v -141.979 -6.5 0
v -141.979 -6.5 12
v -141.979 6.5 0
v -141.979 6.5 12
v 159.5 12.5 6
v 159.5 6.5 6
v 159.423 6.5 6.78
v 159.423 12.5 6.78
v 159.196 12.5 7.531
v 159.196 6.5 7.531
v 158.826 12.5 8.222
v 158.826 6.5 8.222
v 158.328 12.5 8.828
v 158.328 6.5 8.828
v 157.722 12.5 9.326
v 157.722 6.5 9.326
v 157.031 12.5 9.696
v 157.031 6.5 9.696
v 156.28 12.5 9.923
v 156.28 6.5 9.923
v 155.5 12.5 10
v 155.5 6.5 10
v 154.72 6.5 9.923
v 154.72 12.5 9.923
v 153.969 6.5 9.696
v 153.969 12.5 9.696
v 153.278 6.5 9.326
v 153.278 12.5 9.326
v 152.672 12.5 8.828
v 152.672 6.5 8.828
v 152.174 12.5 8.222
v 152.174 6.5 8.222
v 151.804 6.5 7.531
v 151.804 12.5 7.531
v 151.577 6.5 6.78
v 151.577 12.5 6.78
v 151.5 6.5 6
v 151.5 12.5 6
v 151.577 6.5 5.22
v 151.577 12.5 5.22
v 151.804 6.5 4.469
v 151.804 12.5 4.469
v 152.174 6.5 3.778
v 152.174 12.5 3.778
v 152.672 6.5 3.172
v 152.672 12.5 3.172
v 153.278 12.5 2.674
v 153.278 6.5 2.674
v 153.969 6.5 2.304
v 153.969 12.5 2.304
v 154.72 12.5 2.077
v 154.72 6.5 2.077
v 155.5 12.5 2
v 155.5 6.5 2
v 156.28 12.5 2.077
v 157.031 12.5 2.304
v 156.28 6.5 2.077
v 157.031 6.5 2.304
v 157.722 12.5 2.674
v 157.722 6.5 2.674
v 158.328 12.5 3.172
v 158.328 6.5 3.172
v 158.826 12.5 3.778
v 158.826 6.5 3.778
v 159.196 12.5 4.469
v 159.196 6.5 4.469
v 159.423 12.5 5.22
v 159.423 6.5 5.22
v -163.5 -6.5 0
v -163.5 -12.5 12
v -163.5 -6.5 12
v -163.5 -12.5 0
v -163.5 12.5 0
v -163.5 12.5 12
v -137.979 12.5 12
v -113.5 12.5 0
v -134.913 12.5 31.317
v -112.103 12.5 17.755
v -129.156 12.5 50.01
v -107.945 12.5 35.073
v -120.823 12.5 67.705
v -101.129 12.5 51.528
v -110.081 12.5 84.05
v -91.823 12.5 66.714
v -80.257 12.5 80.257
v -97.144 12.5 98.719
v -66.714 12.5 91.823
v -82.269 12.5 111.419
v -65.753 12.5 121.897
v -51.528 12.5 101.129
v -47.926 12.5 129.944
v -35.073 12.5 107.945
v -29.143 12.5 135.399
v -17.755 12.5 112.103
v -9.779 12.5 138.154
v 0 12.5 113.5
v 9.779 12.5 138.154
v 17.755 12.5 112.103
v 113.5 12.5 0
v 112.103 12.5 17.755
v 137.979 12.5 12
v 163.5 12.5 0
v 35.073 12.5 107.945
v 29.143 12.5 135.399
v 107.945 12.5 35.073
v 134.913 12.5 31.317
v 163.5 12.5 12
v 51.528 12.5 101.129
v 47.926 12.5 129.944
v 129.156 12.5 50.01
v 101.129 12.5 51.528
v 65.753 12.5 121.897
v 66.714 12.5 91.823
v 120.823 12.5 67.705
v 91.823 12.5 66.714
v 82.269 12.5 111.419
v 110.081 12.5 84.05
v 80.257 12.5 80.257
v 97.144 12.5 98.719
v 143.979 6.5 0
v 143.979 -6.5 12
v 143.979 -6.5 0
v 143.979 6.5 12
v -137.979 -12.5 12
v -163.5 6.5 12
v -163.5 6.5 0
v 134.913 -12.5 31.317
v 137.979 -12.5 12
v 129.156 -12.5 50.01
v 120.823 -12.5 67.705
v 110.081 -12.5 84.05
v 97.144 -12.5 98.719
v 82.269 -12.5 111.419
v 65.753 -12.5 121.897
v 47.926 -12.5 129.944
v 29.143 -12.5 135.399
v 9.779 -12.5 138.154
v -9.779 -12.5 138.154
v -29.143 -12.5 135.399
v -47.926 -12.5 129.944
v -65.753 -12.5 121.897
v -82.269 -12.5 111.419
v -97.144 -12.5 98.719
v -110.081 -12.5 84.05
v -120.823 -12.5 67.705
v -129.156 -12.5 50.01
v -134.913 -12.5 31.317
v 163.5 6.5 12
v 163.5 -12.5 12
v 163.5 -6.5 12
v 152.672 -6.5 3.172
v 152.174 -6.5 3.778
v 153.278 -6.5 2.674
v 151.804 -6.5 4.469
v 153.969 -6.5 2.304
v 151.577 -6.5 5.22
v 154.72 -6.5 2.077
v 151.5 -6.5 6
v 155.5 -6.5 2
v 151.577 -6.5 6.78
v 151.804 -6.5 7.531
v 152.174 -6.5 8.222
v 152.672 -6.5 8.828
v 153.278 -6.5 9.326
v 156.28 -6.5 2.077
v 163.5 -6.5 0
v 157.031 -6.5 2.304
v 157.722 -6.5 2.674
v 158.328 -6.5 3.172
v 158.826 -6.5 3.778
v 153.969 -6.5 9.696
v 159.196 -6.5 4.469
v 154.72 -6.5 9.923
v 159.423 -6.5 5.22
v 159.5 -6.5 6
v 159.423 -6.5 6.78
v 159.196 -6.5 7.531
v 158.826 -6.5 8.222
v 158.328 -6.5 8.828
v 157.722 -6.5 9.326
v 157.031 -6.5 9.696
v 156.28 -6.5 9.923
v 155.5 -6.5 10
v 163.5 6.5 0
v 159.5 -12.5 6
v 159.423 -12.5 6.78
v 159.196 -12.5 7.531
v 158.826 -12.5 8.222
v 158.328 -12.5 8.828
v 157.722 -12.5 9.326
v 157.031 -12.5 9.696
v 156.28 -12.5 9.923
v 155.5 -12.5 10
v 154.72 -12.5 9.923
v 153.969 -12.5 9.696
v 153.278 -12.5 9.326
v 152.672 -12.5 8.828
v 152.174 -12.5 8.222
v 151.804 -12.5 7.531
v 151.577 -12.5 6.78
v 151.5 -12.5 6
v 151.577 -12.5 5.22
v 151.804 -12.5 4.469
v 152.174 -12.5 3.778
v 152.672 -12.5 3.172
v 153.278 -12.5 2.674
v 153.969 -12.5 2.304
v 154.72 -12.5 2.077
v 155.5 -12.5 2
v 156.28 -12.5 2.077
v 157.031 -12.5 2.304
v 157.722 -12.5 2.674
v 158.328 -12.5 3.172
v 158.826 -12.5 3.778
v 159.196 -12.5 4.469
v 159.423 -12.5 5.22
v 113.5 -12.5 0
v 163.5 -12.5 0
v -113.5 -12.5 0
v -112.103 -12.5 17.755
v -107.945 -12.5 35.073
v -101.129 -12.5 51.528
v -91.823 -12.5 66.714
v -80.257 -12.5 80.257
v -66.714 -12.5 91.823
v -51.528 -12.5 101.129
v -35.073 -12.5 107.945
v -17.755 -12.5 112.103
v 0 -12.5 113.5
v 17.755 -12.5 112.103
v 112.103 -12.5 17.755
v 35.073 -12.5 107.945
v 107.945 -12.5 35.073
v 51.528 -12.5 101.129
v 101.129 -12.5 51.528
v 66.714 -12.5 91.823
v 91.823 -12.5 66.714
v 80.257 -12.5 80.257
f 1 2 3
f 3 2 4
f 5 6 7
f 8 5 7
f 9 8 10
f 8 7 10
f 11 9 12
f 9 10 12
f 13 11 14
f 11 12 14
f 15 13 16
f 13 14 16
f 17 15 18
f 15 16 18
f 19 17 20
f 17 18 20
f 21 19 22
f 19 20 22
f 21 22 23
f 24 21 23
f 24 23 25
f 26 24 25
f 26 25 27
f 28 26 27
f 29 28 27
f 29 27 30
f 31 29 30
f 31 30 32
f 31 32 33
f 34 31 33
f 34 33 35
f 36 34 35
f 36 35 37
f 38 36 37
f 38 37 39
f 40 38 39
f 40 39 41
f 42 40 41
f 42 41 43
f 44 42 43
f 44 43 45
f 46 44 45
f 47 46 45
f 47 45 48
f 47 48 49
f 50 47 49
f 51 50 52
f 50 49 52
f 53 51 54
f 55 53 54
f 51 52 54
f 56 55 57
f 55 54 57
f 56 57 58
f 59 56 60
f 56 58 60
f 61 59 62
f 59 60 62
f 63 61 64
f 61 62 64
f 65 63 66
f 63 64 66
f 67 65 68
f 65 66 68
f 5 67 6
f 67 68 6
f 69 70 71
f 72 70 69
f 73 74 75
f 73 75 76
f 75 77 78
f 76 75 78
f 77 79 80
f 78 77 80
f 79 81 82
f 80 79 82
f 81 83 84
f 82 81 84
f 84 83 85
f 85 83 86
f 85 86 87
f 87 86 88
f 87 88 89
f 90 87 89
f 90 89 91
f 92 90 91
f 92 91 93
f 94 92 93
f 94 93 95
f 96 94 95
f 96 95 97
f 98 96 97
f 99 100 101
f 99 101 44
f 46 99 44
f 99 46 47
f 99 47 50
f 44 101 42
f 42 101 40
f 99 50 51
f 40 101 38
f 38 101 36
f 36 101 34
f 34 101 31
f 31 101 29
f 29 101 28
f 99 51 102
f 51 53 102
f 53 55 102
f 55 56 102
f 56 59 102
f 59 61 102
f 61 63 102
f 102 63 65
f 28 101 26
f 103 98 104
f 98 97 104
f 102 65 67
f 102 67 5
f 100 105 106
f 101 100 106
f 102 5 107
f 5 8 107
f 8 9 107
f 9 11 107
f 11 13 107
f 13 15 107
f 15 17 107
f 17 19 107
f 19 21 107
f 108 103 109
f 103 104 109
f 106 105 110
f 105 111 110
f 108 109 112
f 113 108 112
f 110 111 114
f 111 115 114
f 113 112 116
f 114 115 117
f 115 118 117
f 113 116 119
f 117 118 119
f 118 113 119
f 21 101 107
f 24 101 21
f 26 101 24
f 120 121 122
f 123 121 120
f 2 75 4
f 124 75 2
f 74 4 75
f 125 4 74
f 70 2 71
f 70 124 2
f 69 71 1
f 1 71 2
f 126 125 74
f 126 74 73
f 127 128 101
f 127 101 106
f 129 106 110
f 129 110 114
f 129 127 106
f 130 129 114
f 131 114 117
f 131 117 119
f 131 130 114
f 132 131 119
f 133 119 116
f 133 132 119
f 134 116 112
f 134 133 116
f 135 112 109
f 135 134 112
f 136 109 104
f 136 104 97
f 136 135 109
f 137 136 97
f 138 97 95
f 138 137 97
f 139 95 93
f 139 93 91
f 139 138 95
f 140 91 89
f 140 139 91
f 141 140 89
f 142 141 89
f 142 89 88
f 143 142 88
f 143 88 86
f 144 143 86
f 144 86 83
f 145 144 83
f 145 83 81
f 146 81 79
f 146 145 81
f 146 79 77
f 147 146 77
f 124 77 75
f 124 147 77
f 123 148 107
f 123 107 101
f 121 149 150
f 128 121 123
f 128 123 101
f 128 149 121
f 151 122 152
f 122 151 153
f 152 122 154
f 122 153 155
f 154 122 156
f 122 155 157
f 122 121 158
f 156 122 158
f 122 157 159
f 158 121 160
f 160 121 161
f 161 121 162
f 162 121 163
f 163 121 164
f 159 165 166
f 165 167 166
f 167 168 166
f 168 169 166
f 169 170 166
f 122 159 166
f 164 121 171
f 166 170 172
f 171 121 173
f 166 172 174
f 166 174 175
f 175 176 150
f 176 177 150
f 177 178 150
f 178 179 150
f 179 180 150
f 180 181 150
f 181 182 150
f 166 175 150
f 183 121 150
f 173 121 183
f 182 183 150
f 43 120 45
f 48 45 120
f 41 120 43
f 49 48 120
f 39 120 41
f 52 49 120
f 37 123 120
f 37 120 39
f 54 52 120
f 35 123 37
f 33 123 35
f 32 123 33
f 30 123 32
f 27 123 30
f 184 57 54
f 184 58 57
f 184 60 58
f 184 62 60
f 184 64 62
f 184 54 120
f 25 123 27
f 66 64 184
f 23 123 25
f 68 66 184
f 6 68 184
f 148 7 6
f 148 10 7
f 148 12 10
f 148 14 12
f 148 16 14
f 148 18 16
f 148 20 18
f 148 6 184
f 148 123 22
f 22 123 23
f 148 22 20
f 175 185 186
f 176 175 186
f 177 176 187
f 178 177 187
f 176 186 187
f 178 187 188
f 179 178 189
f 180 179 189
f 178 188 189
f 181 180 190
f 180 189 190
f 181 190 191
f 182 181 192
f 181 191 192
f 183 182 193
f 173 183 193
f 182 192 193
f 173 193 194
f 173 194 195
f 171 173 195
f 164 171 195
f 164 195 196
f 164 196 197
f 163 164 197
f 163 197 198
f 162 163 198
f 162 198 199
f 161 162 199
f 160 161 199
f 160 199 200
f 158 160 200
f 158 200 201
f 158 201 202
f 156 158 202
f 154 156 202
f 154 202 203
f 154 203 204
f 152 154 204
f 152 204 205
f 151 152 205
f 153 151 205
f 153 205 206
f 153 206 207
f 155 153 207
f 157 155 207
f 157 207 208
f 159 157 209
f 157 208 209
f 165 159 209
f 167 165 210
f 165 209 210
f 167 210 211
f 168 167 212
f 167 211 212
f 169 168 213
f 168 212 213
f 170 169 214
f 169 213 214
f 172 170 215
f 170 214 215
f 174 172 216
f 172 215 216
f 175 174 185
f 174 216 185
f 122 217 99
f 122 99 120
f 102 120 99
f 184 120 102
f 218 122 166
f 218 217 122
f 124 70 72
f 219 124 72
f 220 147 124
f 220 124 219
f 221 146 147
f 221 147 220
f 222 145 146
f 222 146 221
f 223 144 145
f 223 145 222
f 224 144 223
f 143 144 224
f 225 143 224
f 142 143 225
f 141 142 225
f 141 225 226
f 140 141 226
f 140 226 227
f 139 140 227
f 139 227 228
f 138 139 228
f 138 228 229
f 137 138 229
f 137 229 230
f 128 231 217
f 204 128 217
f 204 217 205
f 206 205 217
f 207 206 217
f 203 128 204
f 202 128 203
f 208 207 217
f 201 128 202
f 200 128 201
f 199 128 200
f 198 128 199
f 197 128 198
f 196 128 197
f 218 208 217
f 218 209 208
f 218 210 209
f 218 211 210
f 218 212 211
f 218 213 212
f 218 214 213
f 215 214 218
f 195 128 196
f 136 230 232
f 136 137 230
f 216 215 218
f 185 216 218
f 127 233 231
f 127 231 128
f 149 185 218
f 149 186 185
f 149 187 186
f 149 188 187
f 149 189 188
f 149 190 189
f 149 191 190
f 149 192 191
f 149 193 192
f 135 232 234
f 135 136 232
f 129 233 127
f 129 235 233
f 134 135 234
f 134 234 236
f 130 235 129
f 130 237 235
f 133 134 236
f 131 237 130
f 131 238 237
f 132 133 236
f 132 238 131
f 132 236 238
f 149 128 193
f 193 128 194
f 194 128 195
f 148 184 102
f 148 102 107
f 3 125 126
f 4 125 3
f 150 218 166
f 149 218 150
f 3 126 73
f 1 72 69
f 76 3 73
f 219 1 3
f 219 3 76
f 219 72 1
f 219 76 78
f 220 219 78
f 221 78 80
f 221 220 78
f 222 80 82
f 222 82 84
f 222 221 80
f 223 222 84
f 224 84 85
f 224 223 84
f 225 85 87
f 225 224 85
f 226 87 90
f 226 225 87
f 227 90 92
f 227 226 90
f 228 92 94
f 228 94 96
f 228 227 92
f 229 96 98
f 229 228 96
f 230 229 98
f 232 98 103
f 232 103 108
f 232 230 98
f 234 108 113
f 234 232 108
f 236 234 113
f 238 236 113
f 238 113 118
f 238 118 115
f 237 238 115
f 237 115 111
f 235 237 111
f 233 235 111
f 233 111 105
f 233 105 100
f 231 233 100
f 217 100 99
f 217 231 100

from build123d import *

# Parameters (mm, degrees)
F1_DEPTH = 12.5
F2_W     = 19.5208349061
F2_H     = 13
F3_DEPTH = 12.001
F4_W     = 21.5208349061
F4_H     = 13
F5_DEPTH = 12.001
F6_R     = 4
F7_DEPTH = 25.001


with BuildPart() as f1:
    # F0 (on Front) → F1 (new body, symmetric)
    with BuildSketch(Plane.XZ):
        with BuildLine():
            ThreePointArc((137.9791650939, 12), (138.369730009, 6.0056487784), (138.5, 0))
            Line((138.5, 0), (163.5, 0))
            Line((163.5, 0), (163.5, 12))
            Line((163.5, 12), (137.9791650939, 12))
        make_face()
        with BuildLine():
            Line((-163.5, 0), (-138.5, 0))
            ThreePointArc((-138.5, 0), (-138.369730009, 6.0056487784), (-137.9791650939, 12))
            Line((-137.9791650939, 12), (-163.5, 12))
            Line((-163.5, 12), (-163.5, 0))
        make_face()
        with BuildLine():
            ThreePointArc((-113.5, 0), (0, 113.5), (113.5, 0))
            Line((113.5, 0), (138.5, 0))
            ThreePointArc((138.5, 0), (138.369730009, 6.0056487784), (137.9791650939, 12))
            ThreePointArc((137.9791650939, 12), (0, 138.5), (-137.9791650939, 12))
            ThreePointArc((-137.9791650939, 12), (-138.369730009, 6.0056487784), (-138.5, 0))
            Line((-138.5, 0), (-113.5, 0))
        make_face()
    extrude(amount=F1_DEPTH, both=True)

    # F2 (on face) → F3 (cut, through all)
    with BuildSketch(Plane.XY.offset(12)):
        with Locations((153.7395825469, 0)):
            Rectangle(F2_W, F2_H)
    extrude(amount=-F3_DEPTH, mode=Mode.SUBTRACT)

    # F4 (on face) → F5 (cut, through all)
    with BuildSketch(Plane.XY.offset(12)):
        with Locations((-152.7395825469, 0)):
            Rectangle(F4_W, F4_H)
    extrude(amount=-F5_DEPTH, mode=Mode.SUBTRACT)

    # F6 (on face) → F7 (cut, through all)
    with BuildSketch(Plane.XZ.offset(12.5)):
        with Locations((155.5, 6)):
            Circle(F6_R)
    extrude(amount=-F7_DEPTH, mode=Mode.SUBTRACT)


solid = f1.part
